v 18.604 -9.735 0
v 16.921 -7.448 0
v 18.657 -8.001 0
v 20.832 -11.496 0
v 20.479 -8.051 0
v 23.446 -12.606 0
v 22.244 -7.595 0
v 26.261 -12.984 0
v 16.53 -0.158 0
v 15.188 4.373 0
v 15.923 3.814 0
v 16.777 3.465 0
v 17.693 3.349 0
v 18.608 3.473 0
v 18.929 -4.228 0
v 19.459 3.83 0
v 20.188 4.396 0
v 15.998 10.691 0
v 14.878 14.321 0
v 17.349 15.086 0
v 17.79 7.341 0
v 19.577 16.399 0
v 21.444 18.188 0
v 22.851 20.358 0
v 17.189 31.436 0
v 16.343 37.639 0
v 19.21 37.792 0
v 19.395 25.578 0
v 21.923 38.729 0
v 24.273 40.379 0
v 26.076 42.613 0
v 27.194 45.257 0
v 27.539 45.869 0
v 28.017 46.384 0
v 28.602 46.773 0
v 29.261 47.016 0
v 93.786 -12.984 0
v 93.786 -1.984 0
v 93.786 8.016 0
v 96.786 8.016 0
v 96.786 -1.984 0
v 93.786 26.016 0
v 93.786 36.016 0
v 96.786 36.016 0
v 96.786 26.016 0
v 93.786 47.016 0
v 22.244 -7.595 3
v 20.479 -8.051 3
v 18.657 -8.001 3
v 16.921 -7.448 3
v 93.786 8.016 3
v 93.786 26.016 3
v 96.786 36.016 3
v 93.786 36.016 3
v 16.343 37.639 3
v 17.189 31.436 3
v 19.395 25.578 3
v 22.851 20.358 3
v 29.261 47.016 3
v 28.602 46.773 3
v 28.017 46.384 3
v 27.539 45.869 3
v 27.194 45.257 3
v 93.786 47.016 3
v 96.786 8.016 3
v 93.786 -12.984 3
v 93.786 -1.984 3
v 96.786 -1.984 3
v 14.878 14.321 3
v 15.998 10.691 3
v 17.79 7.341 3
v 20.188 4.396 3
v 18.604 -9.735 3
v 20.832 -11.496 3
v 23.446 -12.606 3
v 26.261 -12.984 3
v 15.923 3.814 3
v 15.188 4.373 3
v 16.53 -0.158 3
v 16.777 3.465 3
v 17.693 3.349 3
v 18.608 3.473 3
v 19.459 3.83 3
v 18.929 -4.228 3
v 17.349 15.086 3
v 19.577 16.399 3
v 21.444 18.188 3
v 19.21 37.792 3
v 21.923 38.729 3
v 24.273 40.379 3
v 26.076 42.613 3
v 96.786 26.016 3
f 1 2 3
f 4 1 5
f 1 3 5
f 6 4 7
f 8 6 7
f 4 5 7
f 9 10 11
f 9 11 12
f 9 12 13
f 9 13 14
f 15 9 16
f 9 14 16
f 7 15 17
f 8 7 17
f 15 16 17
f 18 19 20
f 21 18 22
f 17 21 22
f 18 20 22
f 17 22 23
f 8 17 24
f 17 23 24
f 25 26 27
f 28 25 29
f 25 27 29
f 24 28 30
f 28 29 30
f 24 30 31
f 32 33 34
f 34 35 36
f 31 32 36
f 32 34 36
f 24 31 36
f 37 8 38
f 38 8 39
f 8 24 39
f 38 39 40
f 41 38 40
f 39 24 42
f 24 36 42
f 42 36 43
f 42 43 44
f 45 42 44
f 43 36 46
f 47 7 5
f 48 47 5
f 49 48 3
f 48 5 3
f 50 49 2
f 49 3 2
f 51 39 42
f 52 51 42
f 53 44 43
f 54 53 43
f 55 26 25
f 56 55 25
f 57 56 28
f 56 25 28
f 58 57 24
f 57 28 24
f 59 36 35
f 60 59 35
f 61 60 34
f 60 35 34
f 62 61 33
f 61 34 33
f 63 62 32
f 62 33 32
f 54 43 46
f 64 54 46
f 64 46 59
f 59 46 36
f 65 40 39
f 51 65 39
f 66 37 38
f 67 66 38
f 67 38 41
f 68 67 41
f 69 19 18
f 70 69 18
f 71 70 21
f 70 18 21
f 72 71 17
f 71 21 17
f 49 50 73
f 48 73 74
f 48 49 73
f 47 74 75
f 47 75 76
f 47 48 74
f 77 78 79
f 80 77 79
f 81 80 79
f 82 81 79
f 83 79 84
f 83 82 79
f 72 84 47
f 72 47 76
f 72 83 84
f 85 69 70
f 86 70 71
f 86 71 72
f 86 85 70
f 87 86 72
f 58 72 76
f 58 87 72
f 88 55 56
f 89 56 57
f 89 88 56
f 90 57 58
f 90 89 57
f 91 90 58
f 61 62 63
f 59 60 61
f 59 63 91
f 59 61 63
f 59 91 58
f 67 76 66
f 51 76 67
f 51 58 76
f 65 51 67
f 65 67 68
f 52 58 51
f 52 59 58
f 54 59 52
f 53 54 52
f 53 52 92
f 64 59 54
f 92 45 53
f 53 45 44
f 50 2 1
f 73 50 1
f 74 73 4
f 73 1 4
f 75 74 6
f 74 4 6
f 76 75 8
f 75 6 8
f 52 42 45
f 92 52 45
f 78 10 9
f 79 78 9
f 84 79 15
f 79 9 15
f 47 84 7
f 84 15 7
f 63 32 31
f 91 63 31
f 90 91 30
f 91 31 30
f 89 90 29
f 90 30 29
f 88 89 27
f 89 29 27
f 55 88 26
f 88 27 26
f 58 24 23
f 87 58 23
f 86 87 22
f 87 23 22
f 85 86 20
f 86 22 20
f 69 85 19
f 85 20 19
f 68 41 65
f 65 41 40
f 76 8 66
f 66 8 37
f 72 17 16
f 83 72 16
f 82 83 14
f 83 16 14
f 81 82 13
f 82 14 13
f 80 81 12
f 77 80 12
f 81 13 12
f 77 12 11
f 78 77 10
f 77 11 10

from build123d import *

# Parameters (mm, degrees)
SALIENTE_EXTRUIR1_DEPTH = 3


with BuildPart() as part:
    # Model → Saliente-Extruir1 (new body)
    with BuildSketch(Plane.XY):
        with BuildLine():
            Line((96.785797009, 36.015840028), (93.785797009, 36.015840028))
            Line((93.785797009, 36.015840028), (93.785797009, 47.015840028))
            Line((93.785797009, 47.015840028), (31.751178944, 47.015840028))
            Line((31.751178944, 47.015840028), (29.260721948, 47.015840028))
            ThreePointArc((29.260721948, 47.015840028), (28.01691559, 46.383744396), (27.193529557, 45.257407597))
            ThreePointArc((27.193529557, 45.257407597), (23.155632663, 39.471985621), (16.34281865, 37.638605137))
            ThreePointArc((16.34281865, 37.638605137), (18.127374477, 28.444980745), (22.850598251, 20.358045222))
            ThreePointArc((22.850598251, 20.358045222), (19.57702332, 16.398637511), (14.878347932, 14.321222809))
            ThreePointArc((14.878347932, 14.321222809), (16.813155193, 8.973175992), (20.188286302, 4.395668604))
            ThreePointArc((20.188286302, 4.395668604), (17.693087489, 3.34861877), (15.188339451, 4.372614734))
            ThreePointArc((15.188339451, 4.372614734), (17.604909212, -2.266185371), (22.24359433, -7.594982292))
            ThreePointArc((22.24359433, -7.594982292), (19.566527855, -8.089682901), (16.920851616, -7.447958005))
            ThreePointArc((16.920851616, -7.447958005), (20.831880227, -11.496375144), (26.260721948, -12.984159972))
            Line((26.260721948, -12.984159972), (36.41114869, -12.984159972))
            Line((36.41114869, -12.984159972), (93.785797009, -12.984159972))
            Line((93.785797009, -12.984159972), (93.785797009, -1.984159972))
            Line((93.785797009, -1.984159972), (96.785797009, -1.984159972))
            Line((96.785797009, -1.984159972), (96.785797009, 8.015840028))
            Line((96.785797009, 8.015840028), (93.785797009, 8.015840028))
            Line((93.785797009, 8.015840028), (93.785797009, 26.015840028))
            Line((93.785797009, 26.015840028), (96.785797009, 26.015840028))
            Line((96.785797009, 26.015840028), (96.785797009, 36.015840028))
        make_face()
    extrude(amount=SALIENTE_EXTRUIR1_DEPTH)


solid = part.part
